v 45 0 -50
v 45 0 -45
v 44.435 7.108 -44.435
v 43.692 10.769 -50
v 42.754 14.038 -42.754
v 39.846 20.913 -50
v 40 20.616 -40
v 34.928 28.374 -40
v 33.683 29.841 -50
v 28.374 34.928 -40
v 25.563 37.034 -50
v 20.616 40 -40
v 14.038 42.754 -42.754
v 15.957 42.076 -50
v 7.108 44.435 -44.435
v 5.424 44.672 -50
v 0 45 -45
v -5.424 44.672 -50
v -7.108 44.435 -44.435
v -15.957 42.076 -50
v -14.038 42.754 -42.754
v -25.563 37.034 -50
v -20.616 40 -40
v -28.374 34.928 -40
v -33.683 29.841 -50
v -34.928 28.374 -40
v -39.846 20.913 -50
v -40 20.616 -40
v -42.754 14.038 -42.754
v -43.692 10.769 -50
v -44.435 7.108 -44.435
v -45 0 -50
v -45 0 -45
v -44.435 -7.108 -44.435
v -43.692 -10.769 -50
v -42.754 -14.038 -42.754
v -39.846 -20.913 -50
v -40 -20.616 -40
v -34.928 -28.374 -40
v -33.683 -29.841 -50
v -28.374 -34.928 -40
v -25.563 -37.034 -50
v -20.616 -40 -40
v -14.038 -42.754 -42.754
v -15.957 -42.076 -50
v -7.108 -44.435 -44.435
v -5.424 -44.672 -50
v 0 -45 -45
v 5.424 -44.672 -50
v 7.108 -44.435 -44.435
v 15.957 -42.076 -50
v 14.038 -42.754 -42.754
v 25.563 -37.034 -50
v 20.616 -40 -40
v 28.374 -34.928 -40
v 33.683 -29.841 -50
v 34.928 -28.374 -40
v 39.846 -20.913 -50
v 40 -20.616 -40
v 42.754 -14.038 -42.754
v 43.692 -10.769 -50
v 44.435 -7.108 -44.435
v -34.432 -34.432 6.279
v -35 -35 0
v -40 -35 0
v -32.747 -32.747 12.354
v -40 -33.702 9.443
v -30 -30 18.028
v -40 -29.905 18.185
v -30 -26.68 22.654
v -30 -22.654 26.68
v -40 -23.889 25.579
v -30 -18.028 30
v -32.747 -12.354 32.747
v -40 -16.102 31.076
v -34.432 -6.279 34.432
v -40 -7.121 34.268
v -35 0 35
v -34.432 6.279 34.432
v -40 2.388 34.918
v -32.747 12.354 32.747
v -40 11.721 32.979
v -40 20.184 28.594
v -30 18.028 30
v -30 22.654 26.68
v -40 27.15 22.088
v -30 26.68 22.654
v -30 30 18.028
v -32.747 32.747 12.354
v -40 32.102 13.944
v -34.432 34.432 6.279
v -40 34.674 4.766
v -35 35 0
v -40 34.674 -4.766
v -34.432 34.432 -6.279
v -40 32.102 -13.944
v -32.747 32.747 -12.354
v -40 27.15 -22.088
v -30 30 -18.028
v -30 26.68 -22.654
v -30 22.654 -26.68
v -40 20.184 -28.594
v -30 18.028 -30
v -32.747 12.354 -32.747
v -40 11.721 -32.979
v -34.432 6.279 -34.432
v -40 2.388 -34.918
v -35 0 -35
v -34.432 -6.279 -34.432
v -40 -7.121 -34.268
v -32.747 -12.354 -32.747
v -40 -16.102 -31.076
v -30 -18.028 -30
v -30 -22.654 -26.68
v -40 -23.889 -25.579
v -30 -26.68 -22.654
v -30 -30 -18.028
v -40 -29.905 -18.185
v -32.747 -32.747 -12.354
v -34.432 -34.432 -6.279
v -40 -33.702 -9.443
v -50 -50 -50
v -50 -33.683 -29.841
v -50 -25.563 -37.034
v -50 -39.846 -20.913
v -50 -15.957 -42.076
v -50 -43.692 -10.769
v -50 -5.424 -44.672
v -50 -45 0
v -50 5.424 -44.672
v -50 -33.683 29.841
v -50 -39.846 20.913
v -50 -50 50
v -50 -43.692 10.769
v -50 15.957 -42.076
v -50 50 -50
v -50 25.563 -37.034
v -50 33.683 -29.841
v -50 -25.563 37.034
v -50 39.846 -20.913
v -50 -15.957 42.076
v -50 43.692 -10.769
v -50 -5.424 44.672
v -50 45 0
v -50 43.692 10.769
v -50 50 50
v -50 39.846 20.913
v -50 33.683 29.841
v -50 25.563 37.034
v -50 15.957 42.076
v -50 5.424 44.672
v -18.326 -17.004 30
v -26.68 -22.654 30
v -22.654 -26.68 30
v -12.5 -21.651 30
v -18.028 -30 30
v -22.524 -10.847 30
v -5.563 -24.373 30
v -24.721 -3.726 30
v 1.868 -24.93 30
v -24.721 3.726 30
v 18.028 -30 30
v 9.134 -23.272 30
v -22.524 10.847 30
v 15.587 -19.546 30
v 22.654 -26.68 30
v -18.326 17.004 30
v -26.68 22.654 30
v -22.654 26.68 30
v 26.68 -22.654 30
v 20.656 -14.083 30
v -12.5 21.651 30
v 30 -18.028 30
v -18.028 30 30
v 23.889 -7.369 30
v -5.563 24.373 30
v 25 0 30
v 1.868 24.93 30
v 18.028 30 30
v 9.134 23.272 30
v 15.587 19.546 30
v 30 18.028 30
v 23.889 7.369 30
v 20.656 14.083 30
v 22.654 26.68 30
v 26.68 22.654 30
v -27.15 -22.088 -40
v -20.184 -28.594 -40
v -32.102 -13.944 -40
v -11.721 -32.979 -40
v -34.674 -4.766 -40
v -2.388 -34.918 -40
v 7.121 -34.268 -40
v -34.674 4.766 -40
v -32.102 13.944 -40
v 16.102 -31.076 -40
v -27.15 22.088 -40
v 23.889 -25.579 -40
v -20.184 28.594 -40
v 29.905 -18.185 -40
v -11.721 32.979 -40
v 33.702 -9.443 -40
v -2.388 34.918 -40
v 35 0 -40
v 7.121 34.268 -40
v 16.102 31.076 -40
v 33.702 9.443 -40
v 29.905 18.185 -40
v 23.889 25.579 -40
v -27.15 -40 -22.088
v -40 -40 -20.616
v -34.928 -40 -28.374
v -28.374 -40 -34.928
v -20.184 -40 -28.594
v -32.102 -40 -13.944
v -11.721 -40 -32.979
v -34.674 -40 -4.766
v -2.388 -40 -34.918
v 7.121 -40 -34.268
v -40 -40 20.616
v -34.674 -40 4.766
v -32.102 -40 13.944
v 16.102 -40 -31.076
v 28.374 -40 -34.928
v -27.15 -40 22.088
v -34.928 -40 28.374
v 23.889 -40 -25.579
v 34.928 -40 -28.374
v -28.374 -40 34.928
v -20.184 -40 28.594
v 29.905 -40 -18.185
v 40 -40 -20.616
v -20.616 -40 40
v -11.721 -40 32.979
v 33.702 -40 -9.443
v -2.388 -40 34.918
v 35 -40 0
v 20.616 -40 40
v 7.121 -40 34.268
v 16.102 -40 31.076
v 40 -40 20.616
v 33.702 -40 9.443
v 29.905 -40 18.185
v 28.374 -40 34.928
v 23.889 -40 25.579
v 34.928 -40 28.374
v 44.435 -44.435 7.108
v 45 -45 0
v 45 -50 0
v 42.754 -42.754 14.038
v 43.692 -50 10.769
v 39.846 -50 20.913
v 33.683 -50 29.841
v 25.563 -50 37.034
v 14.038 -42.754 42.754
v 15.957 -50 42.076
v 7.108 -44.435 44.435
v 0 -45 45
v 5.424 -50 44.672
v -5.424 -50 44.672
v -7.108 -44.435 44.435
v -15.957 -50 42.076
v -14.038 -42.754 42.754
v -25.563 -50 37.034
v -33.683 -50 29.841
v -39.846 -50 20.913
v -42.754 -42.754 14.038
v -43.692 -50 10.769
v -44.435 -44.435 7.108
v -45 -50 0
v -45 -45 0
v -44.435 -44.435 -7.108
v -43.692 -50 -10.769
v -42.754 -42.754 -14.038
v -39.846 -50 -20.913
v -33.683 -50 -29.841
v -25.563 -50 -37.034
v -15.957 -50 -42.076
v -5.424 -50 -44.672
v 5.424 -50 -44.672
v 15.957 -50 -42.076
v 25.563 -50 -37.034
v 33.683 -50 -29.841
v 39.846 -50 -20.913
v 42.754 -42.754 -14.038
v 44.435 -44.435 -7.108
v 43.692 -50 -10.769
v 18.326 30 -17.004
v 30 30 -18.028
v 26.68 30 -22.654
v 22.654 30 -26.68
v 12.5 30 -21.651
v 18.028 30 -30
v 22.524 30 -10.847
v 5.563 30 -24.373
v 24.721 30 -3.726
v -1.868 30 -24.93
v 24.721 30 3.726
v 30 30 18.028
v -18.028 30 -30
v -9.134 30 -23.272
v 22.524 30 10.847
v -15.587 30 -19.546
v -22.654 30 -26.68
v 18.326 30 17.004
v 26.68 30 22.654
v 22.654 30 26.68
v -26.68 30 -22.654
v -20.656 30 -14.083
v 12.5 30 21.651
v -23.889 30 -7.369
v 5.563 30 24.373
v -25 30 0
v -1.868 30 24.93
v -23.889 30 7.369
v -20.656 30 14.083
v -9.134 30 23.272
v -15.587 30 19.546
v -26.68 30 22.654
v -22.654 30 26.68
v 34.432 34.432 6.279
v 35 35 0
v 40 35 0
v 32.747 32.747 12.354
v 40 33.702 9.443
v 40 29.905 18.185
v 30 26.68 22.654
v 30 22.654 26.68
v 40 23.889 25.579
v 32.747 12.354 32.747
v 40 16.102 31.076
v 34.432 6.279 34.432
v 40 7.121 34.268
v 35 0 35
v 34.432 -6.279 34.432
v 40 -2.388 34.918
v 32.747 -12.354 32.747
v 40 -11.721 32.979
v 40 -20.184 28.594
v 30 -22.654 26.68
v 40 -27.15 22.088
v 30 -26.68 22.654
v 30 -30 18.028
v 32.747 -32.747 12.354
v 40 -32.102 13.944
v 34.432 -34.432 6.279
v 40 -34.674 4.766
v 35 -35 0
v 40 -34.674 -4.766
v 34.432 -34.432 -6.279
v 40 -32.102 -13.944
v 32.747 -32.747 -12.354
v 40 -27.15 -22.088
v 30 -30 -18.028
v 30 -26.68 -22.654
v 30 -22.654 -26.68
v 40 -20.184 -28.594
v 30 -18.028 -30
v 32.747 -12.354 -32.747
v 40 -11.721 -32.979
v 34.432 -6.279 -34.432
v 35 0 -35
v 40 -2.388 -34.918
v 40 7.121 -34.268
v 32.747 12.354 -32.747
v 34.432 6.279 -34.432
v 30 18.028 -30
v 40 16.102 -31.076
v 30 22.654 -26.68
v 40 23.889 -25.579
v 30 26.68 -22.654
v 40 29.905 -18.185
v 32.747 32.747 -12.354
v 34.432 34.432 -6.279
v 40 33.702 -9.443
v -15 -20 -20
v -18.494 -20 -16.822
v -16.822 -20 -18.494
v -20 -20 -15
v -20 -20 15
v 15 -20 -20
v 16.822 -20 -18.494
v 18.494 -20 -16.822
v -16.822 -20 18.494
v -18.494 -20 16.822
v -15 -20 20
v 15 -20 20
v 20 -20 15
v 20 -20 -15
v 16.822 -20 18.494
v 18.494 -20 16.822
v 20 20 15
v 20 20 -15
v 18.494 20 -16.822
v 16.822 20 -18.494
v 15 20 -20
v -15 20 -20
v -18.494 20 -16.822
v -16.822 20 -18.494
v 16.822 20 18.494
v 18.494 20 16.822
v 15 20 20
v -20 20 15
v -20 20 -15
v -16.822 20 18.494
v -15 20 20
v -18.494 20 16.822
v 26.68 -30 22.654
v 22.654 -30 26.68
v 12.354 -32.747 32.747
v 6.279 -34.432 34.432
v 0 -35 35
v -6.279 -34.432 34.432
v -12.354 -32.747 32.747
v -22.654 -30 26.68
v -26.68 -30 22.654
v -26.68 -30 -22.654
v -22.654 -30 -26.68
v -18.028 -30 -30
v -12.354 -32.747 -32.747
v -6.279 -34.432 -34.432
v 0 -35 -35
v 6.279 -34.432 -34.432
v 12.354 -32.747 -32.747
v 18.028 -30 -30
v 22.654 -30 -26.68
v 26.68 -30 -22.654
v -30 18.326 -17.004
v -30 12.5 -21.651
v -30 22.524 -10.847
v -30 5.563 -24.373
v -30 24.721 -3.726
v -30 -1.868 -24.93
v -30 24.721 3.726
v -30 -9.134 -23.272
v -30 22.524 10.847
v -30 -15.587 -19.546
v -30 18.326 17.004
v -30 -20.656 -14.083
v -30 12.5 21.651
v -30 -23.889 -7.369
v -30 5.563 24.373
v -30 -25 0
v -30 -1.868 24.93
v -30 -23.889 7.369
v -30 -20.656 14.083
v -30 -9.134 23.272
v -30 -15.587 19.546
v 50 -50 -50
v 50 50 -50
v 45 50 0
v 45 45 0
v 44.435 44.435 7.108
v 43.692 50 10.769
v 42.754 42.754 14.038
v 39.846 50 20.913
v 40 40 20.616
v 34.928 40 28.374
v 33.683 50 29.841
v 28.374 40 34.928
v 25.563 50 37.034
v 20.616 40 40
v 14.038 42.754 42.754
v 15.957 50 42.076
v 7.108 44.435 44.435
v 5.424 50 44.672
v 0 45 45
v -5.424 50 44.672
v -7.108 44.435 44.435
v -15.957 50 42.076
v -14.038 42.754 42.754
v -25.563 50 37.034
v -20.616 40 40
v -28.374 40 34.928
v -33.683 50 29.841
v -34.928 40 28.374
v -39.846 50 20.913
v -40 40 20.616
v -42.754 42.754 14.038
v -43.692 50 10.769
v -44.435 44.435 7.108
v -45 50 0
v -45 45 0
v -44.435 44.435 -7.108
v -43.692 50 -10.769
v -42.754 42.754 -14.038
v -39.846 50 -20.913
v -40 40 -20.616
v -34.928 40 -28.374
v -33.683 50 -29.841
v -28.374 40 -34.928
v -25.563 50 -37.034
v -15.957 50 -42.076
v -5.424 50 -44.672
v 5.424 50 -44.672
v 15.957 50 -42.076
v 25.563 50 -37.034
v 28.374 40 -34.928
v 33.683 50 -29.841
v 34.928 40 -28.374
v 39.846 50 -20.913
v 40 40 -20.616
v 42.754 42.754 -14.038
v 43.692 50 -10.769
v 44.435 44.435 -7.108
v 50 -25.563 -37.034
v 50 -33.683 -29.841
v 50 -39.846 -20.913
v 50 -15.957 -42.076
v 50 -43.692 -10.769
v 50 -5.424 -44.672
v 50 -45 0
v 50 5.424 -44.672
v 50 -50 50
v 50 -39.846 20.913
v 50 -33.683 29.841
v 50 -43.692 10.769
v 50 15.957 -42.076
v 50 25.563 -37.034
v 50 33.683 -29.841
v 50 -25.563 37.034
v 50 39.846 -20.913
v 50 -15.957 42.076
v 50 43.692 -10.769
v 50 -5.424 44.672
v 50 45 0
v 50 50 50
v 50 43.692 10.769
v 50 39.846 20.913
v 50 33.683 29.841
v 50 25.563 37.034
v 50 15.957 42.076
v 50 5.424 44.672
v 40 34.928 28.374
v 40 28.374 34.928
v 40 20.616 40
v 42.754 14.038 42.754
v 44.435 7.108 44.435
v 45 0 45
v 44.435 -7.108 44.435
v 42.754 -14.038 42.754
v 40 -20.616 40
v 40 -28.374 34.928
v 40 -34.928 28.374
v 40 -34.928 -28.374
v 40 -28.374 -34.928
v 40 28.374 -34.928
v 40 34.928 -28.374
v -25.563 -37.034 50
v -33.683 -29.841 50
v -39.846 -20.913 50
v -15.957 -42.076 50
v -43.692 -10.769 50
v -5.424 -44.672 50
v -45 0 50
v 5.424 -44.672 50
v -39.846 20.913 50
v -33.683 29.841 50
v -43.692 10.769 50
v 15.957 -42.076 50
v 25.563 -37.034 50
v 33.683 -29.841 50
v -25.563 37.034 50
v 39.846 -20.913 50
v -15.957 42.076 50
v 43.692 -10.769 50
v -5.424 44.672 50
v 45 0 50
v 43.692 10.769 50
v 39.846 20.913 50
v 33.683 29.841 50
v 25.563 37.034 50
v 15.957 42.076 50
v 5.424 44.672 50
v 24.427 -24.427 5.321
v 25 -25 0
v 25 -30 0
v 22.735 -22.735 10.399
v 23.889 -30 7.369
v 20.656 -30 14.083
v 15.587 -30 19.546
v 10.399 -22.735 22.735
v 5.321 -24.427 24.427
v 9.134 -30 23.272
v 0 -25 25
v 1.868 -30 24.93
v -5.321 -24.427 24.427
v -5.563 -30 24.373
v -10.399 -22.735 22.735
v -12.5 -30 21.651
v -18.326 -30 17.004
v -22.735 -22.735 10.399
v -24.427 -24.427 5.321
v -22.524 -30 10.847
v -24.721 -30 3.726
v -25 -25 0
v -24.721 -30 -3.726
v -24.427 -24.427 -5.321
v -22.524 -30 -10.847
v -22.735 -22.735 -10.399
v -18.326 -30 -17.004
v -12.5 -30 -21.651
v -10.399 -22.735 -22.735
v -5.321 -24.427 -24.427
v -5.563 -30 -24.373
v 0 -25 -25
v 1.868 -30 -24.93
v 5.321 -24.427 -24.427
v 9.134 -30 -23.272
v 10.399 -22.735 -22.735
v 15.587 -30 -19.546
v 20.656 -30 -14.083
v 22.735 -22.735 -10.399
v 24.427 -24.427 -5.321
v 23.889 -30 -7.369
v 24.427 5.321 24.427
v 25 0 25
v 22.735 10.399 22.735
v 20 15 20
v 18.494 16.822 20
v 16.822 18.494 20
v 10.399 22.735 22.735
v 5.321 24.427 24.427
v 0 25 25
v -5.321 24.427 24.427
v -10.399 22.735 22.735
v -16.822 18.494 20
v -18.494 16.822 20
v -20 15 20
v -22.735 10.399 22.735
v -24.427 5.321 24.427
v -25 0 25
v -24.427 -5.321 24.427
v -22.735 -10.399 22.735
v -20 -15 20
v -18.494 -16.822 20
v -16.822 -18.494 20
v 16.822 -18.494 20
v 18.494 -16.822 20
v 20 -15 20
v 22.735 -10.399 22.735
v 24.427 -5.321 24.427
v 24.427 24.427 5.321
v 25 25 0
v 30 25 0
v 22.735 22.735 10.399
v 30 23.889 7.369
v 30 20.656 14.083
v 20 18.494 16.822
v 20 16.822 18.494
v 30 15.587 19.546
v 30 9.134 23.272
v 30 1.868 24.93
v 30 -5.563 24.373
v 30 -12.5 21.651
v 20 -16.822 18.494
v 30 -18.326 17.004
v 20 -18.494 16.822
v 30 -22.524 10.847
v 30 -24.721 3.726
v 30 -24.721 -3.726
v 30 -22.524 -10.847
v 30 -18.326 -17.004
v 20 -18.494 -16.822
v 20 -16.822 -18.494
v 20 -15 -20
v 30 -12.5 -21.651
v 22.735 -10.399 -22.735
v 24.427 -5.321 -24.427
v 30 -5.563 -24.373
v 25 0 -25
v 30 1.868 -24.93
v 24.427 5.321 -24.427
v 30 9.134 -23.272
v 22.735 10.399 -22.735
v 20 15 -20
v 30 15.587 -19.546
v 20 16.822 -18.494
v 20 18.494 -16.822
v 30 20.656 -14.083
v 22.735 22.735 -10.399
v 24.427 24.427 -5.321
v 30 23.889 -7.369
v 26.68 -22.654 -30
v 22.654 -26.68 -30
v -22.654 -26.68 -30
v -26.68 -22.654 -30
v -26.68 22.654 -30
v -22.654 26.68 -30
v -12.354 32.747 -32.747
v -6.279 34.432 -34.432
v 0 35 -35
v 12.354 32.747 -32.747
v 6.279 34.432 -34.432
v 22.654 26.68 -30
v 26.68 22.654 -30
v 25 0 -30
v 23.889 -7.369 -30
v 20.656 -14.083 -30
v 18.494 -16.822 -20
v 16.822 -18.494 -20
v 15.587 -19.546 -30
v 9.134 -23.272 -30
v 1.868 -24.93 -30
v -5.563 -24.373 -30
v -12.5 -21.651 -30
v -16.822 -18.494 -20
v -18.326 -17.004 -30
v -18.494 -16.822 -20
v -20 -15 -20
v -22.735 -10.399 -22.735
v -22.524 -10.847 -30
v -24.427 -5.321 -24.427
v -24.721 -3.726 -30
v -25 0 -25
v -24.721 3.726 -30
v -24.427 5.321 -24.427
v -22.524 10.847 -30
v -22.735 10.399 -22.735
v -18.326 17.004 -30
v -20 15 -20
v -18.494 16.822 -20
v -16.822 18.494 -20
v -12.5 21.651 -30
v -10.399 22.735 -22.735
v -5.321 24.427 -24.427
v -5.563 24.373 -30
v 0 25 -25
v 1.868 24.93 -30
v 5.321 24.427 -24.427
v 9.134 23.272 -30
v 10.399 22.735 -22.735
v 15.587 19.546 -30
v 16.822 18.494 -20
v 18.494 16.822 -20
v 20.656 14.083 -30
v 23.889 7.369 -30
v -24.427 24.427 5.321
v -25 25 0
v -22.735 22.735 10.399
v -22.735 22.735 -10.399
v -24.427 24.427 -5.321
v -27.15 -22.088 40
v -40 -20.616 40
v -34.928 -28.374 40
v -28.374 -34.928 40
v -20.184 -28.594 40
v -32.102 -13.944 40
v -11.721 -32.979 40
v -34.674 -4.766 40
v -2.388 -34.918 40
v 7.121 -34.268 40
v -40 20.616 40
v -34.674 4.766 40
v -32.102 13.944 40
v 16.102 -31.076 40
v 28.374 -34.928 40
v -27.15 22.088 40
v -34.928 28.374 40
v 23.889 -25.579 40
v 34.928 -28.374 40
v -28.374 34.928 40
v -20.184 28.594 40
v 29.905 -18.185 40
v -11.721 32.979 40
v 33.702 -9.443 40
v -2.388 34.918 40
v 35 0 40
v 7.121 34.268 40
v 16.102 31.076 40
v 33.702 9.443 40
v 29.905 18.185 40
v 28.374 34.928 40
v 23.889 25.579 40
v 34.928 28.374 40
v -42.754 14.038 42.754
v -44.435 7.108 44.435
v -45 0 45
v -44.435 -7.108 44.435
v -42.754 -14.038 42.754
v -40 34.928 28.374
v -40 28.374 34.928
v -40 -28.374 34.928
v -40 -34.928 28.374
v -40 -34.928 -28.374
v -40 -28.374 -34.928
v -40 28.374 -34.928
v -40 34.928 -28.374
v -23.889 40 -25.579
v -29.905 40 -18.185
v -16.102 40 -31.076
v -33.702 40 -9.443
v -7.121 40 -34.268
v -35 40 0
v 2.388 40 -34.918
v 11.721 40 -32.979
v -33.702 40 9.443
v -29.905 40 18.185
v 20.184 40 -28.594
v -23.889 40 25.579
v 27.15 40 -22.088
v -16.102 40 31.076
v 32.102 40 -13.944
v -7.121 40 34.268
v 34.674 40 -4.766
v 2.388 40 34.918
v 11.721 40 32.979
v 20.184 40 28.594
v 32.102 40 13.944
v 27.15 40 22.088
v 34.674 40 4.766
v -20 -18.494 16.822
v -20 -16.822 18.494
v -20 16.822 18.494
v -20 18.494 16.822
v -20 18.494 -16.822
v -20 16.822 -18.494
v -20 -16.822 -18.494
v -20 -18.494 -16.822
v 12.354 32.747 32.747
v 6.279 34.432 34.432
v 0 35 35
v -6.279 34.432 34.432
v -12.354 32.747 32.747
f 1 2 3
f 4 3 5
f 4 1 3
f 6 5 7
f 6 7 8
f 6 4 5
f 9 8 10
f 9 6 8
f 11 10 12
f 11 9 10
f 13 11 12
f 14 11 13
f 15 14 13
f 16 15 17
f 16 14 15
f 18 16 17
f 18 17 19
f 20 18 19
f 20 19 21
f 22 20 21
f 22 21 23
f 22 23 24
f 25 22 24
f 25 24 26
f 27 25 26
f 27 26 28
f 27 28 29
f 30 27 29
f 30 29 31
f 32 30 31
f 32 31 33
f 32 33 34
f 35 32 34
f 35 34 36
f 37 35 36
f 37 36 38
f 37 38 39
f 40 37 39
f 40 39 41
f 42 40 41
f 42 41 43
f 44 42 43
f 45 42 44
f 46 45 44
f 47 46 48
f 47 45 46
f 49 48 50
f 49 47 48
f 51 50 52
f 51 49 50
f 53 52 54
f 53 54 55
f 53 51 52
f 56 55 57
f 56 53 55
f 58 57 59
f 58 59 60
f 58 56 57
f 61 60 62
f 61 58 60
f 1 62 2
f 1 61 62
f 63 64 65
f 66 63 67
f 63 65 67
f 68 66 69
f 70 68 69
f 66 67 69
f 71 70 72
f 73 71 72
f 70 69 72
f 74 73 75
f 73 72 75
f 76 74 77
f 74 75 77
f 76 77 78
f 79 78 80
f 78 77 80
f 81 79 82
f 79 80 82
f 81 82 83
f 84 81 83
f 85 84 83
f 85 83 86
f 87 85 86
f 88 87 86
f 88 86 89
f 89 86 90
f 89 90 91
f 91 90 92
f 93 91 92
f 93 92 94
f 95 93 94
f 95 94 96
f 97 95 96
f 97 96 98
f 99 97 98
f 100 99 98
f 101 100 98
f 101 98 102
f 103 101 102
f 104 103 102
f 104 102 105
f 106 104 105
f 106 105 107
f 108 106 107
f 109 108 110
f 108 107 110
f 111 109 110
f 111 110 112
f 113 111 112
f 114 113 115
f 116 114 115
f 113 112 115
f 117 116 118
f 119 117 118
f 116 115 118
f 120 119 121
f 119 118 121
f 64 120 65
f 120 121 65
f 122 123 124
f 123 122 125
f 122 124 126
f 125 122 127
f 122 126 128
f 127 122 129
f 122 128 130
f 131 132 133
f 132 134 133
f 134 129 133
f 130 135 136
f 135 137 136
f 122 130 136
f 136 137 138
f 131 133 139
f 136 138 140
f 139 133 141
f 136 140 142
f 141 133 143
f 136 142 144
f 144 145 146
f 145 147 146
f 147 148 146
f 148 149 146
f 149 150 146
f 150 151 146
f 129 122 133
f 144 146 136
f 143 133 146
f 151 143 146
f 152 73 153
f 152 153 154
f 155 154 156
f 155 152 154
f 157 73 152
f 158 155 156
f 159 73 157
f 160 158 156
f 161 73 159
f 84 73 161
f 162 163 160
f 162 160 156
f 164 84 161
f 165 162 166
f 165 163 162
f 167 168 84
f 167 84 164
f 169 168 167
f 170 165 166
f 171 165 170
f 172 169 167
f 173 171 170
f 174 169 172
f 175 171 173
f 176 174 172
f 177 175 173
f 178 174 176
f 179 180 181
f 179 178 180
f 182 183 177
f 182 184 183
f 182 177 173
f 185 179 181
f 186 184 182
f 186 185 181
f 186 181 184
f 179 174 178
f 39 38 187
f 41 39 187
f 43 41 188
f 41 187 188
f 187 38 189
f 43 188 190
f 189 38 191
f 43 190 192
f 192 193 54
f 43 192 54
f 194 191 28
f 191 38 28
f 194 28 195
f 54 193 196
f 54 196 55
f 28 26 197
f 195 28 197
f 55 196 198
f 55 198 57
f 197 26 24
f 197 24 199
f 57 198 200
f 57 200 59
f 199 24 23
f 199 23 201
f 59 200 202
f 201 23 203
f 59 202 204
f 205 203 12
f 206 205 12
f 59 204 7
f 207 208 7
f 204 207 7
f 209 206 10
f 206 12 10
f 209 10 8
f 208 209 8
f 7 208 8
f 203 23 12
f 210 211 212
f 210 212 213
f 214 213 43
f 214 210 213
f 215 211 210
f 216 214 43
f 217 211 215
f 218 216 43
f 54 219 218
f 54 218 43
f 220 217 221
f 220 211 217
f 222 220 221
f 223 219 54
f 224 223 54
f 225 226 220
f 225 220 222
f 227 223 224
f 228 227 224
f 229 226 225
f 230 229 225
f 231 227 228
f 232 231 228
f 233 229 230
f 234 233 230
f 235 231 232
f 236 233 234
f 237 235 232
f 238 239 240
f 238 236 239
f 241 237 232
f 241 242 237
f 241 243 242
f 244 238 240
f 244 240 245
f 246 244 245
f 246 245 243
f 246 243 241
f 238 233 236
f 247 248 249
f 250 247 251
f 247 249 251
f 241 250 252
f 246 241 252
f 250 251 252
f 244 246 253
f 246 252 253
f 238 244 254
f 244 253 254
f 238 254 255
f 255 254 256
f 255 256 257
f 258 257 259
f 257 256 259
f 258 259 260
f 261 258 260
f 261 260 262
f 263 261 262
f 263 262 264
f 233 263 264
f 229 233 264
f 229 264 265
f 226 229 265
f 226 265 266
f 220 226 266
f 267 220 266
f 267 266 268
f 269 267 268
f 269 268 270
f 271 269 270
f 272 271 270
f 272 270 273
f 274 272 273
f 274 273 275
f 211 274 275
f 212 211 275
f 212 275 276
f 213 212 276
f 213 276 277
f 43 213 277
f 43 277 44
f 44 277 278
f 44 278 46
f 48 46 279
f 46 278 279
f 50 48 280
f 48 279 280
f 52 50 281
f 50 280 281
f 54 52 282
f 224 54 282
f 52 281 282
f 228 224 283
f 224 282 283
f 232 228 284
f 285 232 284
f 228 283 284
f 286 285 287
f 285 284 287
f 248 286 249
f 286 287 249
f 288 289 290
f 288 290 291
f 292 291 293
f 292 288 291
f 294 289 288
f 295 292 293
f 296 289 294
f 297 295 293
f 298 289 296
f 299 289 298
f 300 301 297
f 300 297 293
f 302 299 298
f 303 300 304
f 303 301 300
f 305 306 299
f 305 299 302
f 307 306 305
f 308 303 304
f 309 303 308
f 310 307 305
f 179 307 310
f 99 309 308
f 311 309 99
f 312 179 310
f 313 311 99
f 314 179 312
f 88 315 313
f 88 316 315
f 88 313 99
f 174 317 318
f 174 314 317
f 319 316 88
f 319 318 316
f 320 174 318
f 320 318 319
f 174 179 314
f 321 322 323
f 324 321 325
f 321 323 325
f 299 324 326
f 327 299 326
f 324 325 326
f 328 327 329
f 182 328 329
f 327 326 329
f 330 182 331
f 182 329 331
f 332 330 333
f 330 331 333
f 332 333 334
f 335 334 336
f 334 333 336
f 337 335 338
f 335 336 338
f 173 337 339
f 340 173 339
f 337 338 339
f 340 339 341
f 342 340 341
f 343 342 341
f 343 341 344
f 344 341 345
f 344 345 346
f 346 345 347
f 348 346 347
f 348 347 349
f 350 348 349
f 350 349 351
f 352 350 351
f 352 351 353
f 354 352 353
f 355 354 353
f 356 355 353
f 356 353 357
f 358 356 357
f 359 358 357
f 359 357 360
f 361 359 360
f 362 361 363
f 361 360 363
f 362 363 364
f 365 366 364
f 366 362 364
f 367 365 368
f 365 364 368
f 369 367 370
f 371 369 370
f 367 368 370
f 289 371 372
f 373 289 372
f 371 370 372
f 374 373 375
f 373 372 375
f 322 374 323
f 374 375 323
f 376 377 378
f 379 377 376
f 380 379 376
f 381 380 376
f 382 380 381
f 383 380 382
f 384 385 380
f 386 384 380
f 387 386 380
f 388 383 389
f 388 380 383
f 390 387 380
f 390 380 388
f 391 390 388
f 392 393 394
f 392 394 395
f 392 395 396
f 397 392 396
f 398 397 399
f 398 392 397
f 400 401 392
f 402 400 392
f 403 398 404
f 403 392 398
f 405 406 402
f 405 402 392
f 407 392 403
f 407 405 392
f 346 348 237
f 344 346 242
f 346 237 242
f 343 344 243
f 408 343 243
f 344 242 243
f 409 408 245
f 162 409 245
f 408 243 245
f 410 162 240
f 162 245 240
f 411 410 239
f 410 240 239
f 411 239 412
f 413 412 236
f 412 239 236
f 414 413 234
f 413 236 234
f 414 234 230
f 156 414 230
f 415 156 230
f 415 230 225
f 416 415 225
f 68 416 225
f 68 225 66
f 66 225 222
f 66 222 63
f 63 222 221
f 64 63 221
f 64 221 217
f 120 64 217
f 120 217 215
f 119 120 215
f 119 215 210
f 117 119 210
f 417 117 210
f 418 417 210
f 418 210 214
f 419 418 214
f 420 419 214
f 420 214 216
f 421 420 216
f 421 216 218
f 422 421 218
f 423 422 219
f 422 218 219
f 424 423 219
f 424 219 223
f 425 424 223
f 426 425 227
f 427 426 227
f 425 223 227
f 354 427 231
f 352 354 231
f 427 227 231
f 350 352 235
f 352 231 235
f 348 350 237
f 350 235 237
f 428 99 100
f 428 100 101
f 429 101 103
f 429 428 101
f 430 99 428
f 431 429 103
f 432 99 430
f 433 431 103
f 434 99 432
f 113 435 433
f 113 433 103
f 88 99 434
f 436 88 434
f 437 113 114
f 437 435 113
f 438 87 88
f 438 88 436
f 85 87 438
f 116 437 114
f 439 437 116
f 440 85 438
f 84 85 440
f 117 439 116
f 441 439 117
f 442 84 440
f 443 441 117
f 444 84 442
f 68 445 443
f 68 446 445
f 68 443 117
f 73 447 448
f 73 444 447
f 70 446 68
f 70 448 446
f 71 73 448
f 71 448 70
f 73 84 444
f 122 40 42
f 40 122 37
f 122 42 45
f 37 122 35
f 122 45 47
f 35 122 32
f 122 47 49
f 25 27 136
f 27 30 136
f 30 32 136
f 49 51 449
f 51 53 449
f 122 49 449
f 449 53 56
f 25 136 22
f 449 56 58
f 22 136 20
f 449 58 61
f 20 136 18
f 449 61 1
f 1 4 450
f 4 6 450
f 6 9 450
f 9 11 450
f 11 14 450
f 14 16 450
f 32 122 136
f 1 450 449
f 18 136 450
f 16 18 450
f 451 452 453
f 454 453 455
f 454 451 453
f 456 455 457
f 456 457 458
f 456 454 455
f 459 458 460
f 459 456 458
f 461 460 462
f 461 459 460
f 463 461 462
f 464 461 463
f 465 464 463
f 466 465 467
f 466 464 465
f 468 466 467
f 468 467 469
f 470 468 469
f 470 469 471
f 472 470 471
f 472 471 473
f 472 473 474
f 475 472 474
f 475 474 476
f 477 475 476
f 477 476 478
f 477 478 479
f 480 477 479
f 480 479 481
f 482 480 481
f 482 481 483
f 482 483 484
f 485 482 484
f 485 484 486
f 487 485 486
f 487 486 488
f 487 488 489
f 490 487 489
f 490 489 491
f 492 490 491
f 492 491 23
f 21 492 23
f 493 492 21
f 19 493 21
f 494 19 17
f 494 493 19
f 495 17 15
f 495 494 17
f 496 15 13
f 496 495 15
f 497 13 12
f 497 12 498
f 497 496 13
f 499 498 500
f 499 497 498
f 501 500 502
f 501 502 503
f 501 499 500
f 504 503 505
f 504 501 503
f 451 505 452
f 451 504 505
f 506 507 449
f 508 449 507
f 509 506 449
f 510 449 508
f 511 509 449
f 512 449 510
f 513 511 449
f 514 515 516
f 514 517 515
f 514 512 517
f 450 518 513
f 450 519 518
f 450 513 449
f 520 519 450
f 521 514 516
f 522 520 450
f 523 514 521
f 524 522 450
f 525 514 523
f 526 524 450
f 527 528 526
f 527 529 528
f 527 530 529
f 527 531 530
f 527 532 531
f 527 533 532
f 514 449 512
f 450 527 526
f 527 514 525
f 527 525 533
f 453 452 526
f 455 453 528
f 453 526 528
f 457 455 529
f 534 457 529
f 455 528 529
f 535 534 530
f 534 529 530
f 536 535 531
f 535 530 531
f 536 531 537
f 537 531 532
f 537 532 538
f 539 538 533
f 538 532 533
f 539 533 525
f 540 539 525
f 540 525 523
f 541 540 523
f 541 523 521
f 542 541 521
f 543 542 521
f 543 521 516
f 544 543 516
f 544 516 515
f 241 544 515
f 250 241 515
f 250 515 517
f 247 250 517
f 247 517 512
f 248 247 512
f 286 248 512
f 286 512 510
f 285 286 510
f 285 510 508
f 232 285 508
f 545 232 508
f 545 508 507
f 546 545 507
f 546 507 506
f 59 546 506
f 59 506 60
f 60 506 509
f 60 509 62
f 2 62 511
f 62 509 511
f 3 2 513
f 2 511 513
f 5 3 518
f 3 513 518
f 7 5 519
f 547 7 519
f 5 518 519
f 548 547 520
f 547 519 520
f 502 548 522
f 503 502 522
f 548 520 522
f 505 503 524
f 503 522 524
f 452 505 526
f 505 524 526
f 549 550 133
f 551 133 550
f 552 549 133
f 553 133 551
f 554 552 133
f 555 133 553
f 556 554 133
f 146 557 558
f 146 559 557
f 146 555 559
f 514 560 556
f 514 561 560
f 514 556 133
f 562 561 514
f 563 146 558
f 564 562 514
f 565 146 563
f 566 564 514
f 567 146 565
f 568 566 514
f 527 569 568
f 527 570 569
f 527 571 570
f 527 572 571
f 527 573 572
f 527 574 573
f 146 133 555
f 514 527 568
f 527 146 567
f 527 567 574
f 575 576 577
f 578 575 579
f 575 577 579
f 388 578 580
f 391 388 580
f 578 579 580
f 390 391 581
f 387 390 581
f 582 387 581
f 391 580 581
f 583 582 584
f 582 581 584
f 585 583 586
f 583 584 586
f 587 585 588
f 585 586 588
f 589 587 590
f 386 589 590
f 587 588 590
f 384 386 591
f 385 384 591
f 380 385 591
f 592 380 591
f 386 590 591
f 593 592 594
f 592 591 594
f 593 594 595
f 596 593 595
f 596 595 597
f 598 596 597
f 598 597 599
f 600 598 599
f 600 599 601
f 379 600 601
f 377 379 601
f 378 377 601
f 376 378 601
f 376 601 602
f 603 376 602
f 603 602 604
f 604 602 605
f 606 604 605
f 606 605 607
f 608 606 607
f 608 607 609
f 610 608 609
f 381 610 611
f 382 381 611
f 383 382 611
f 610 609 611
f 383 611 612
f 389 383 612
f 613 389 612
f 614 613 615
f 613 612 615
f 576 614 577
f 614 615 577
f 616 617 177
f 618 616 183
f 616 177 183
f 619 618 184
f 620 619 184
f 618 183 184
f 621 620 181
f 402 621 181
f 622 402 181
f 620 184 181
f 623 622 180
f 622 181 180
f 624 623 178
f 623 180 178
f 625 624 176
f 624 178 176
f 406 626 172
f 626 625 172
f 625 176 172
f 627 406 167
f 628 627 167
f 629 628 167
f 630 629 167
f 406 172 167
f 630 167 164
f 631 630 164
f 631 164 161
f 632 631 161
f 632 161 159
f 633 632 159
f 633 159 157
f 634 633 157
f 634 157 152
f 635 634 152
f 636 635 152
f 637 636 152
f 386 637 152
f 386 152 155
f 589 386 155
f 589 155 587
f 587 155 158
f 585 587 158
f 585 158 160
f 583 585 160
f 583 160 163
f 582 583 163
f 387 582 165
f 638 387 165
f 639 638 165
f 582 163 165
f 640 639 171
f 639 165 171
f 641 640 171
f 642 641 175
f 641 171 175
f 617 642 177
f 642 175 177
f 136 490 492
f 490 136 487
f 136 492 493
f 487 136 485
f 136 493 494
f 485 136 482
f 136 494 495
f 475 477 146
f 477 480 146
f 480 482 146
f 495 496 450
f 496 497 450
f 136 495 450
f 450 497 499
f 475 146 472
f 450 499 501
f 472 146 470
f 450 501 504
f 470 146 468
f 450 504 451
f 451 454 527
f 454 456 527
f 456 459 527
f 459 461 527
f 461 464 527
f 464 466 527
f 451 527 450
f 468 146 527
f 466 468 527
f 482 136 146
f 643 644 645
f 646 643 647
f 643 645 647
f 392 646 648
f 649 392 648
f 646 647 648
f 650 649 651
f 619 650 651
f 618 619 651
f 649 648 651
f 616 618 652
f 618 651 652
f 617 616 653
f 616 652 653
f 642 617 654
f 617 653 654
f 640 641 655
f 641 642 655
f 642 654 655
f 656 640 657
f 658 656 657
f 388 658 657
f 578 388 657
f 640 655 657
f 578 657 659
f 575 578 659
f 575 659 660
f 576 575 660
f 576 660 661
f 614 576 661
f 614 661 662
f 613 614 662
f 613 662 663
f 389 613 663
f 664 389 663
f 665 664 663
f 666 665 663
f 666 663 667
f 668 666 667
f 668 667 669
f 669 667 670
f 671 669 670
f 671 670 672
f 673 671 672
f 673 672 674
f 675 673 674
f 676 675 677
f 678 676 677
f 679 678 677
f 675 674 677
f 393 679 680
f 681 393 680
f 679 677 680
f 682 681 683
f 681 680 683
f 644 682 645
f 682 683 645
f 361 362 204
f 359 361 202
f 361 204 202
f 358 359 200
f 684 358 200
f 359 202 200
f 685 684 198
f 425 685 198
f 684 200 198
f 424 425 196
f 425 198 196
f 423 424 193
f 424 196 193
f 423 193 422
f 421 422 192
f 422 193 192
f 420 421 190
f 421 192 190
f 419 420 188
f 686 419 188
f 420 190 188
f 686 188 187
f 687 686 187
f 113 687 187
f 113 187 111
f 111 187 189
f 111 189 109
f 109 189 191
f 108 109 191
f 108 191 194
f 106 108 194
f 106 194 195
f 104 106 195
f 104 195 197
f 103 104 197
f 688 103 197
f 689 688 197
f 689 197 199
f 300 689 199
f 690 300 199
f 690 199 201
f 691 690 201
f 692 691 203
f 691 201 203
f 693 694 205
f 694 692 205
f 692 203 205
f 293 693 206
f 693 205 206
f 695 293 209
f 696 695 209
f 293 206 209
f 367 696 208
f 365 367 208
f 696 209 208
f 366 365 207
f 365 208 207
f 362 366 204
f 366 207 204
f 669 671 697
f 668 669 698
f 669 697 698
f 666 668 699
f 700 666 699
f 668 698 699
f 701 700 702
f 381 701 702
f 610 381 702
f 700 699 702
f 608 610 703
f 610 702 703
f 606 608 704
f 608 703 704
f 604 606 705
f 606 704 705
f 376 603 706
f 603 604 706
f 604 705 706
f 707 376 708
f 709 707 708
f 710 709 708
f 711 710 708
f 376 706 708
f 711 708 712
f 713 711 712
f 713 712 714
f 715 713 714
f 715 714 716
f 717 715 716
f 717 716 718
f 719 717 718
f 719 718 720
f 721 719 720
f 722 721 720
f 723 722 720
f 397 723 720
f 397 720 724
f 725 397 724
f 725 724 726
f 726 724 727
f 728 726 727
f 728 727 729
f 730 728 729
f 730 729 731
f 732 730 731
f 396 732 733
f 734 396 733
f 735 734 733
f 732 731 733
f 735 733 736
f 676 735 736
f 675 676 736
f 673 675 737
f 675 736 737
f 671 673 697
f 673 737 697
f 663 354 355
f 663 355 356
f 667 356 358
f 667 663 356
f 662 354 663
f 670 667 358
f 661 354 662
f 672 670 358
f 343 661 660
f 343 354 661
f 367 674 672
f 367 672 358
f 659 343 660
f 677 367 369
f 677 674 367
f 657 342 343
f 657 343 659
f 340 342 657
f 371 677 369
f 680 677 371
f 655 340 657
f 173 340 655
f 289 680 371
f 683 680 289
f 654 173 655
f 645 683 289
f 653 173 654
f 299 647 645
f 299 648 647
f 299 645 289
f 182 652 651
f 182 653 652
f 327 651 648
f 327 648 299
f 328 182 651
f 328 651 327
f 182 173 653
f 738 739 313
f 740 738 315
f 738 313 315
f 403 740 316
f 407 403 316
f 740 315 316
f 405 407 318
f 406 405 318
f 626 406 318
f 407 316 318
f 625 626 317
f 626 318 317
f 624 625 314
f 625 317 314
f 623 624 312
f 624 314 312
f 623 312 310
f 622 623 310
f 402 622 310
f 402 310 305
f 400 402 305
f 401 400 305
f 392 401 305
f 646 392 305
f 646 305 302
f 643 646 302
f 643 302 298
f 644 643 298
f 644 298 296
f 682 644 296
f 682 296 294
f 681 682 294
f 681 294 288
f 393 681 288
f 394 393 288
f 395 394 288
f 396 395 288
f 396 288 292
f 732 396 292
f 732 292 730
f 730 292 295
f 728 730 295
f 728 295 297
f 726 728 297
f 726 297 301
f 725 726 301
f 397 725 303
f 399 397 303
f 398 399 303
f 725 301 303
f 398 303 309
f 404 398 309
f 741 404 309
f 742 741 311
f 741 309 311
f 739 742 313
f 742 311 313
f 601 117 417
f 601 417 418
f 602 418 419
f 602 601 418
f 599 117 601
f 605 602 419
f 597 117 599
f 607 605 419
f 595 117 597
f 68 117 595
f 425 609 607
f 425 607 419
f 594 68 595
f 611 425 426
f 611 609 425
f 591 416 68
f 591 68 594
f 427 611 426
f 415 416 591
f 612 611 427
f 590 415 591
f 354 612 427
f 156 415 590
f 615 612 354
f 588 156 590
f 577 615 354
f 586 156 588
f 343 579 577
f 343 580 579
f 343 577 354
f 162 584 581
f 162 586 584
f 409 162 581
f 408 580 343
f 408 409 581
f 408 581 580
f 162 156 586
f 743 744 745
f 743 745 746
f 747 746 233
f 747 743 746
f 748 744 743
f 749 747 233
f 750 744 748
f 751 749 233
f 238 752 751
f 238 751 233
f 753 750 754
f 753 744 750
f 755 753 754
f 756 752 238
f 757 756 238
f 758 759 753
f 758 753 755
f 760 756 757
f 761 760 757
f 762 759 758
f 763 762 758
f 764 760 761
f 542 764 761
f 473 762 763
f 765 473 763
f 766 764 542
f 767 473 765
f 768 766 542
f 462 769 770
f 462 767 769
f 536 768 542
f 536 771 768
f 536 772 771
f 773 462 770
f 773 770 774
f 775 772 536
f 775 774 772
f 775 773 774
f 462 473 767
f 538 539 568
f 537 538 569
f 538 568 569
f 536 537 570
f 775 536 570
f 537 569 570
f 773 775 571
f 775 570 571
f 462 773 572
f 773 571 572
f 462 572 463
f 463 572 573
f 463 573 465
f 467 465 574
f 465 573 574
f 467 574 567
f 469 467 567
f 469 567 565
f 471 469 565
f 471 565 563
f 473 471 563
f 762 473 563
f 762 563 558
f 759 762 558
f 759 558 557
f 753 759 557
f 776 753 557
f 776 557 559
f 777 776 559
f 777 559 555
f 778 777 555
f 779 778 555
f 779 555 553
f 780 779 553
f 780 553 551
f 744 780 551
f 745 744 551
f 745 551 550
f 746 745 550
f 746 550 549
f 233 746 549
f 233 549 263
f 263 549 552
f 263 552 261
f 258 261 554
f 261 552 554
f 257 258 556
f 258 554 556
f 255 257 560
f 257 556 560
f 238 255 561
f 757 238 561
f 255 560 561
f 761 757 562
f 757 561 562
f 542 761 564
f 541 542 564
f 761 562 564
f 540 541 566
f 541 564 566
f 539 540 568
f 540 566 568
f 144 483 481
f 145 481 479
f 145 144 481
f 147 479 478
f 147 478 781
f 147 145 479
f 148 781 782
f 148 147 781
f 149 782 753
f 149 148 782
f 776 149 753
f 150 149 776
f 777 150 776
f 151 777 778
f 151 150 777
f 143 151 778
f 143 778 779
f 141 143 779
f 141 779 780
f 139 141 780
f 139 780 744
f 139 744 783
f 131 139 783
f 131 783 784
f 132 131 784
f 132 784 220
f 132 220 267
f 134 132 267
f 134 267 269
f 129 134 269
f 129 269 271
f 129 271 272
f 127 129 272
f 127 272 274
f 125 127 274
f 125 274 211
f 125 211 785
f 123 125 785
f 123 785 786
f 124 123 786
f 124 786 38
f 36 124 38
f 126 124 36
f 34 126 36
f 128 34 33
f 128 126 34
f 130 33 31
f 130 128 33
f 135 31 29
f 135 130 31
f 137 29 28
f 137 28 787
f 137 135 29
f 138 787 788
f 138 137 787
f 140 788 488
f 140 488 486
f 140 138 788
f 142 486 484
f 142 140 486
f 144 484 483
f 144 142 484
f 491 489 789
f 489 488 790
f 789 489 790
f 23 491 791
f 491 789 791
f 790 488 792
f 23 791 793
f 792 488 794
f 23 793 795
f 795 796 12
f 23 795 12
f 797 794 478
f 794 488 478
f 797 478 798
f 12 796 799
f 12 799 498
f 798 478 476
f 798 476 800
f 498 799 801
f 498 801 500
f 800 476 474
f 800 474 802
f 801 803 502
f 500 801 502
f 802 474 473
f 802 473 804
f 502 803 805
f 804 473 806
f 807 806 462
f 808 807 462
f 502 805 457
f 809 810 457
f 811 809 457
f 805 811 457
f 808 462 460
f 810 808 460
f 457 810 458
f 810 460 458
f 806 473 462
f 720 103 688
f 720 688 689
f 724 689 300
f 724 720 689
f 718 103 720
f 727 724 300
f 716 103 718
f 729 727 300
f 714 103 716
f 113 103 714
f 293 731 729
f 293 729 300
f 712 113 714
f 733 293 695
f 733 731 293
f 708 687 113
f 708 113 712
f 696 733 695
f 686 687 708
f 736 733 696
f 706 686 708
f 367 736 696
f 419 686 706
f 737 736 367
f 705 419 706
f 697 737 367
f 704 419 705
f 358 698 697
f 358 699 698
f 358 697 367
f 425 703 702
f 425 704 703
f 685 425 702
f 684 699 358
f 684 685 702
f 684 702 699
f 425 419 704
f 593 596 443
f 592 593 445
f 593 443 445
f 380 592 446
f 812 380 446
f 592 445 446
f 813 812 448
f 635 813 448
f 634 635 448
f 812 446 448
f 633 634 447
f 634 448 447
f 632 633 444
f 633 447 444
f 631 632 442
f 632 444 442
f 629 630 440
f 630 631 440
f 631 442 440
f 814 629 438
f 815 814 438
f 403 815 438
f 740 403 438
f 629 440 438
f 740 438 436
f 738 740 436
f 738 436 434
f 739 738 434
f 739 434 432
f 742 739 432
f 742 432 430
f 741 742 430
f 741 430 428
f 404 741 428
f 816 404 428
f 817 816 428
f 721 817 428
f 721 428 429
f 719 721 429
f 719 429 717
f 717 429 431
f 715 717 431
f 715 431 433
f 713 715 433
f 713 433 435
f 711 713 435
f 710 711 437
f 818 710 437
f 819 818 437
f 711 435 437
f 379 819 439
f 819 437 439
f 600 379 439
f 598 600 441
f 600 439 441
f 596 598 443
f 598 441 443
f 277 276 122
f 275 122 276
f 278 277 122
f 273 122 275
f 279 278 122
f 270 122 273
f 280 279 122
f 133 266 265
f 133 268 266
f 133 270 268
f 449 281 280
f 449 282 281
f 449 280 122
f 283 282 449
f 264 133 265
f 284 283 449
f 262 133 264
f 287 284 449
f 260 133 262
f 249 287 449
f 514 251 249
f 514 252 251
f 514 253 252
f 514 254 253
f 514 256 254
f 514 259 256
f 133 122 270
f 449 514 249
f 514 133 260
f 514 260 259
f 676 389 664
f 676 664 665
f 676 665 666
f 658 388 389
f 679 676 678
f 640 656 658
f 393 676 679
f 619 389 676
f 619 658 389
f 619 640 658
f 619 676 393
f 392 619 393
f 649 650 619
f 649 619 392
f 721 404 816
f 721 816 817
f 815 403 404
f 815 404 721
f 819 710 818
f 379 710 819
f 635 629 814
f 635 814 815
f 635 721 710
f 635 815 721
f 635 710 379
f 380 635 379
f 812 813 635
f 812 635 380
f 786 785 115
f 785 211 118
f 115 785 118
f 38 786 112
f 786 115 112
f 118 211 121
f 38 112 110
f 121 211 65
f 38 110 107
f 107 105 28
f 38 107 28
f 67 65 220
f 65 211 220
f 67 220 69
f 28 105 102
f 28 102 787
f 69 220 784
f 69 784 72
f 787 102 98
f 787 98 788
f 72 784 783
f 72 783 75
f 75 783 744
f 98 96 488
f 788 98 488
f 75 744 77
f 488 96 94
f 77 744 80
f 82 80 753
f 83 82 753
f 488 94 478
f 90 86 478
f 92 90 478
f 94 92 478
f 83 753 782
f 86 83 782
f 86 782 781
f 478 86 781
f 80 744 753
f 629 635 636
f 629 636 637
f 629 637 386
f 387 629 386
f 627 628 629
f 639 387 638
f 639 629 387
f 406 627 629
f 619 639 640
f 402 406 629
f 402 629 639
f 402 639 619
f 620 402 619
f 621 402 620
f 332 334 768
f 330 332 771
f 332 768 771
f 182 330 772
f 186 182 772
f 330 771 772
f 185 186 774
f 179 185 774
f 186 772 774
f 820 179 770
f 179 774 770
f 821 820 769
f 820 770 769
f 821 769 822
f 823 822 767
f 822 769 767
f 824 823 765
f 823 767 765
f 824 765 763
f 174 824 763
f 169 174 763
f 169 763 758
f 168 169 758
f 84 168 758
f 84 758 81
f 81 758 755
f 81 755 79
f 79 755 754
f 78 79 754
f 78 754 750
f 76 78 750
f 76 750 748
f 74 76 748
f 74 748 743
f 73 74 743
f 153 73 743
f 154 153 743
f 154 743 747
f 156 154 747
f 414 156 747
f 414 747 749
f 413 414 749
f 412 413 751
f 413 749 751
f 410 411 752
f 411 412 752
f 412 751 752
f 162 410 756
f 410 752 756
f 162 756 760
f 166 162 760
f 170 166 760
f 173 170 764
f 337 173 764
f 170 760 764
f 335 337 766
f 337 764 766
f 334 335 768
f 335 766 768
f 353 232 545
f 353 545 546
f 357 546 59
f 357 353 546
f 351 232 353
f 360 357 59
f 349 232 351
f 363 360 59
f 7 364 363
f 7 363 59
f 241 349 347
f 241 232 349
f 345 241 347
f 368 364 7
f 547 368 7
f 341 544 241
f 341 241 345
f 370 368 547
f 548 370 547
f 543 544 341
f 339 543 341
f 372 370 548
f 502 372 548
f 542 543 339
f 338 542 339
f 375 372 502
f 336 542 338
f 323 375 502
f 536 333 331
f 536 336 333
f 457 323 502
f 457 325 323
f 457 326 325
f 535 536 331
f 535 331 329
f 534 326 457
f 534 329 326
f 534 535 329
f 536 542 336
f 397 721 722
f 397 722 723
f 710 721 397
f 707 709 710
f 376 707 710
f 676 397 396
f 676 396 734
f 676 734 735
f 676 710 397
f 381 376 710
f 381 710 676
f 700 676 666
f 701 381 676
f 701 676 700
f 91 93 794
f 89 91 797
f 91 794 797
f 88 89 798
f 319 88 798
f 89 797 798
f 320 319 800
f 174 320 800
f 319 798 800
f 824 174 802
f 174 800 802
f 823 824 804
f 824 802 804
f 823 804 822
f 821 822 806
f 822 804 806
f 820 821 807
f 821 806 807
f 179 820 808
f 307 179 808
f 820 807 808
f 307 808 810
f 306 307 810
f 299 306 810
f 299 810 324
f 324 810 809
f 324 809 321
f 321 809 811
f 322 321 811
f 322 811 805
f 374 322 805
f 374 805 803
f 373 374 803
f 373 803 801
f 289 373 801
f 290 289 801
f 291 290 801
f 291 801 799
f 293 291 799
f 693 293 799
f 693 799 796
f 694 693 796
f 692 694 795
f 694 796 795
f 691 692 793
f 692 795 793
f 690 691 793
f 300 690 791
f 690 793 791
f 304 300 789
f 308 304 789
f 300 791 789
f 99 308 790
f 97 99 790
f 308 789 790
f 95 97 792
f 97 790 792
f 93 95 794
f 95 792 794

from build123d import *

# Parameters (mm, degrees)
F2_W          = 100
F2_H          = 100
F3_DEPTH      = 50
F3_DEPTH_BACK = 50
F5_R          = 45
F6_DEPTH      = 10
F8_R          = 45
F9_DEPTH      = 10
F11_R         = 45
F12_DEPTH     = 10
F14_R         = 45
F15_DEPTH     = 10
F17_R         = 45
F18_DEPTH     = 10
F20_R         = 45
F21_DEPTH     = 10
F22_R         = 35
F23_DEPTH     = 10
F24_R         = 35
F25_DEPTH     = 10
F26_R         = 35
F27_DEPTH     = 10
F28_R         = 35
F29_DEPTH     = 10
F30_R         = 35
F31_DEPTH     = 10
F32_R         = 35
F33_DEPTH     = 10
F34_R         = 25
F35_DEPTH     = 10
F36_R         = 25
F37_DEPTH     = 10
F38_R         = 25
F39_DEPTH     = 10
F40_R         = 25
F41_DEPTH     = 10
F42_R         = 25
F43_DEPTH     = 10
F44_R         = 25
F45_DEPTH     = 10


with BuildPart() as f3:
    # F2 (on Top) → F3 (new body, two sides)
    with BuildSketch(Plane.XY) as f3_sk:
        Rectangle(F2_W, F2_H)
    extrude(amount=F3_DEPTH)
    extrude(f3_sk.sketch, amount=-F3_DEPTH_BACK)

    # F5 (on offset) → F6 (cut)
    with BuildSketch(Plane.XZ.offset(50)):
        Circle(F5_R)
    extrude(amount=-F6_DEPTH, mode=Mode.SUBTRACT)

    # F8 (on offset) → F9 (cut)
    with BuildSketch(Plane.YZ.offset(50)):
        Circle(F8_R)
    extrude(amount=-F9_DEPTH, mode=Mode.SUBTRACT)

    # F11 (on offset) → F12 (cut)
    with BuildSketch(Plane.XY.offset(50)):
        Circle(F11_R)
    extrude(amount=-F12_DEPTH, mode=Mode.SUBTRACT)

    # F14 (on offset) → F15 (cut)
    with BuildSketch(Plane.XY.offset(-50)):
        Circle(F14_R)
    extrude(amount=F15_DEPTH, mode=Mode.SUBTRACT)

    # F17 (on offset) → F18 (cut)
    with BuildSketch(Plane.XZ.offset(-50)):
        Circle(F17_R)
    extrude(amount=F18_DEPTH, mode=Mode.SUBTRACT)

    # F20 (on offset) → F21 (cut)
    with BuildSketch(Plane.YZ.offset(-50)):
        Circle(F20_R)
    extrude(amount=F21_DEPTH, mode=Mode.SUBTRACT)

    # F22 (on face) → F23 (cut)
    with BuildSketch(Plane(origin=(-40, 0, 0), x_dir=(0, -1, 0), z_dir=(-1, 0, 0))):
        Circle(F22_R)
    extrude(amount=-F23_DEPTH, mode=Mode.SUBTRACT)

    # F24 (on face) → F25 (cut)
    with BuildSketch(Plane.XZ.offset(40)):
        Circle(F24_R)
    extrude(amount=-F25_DEPTH, mode=Mode.SUBTRACT)

    # F26 (on face) → F27 (cut)
    with BuildSketch(Plane.XY.offset(40)):
        Circle(F26_R)
    extrude(amount=-F27_DEPTH, mode=Mode.SUBTRACT)

    # F28 (on face) → F29 (cut)
    with BuildSketch(Plane(origin=(0, 40, 0), x_dir=(-1, 0, 0), z_dir=(0, 1, 0))):
        Circle(F28_R)
    extrude(amount=-F29_DEPTH, mode=Mode.SUBTRACT)

    # F30 (on face) → F31 (cut)
    with BuildSketch(Plane(origin=(0, 0, -40), x_dir=(1, 0, 0), z_dir=(0, 0, -1))):
        Circle(F30_R)
    extrude(amount=-F31_DEPTH, mode=Mode.SUBTRACT)

    # F32 (on face) → F33 (cut)
    with BuildSketch(Plane.YZ.offset(40)):
        Circle(F32_R)
    extrude(amount=-F33_DEPTH, mode=Mode.SUBTRACT)

    # F34 (on face) → F35 (cut)
    with BuildSketch(Plane.XZ.offset(30)):
        Circle(F34_R)
    extrude(amount=-F35_DEPTH, mode=Mode.SUBTRACT)

    # F36 (on face) → F37 (cut)
    with BuildSketch(Plane(origin=(0, 0, -30), x_dir=(1, 0, 0), z_dir=(0, 0, -1))):
        Circle(F36_R)
    extrude(amount=-F37_DEPTH, mode=Mode.SUBTRACT)

    # F38 (on face) → F39 (cut)
    with BuildSketch(Plane(origin=(0, 30, 0), x_dir=(-1, 0, 0), z_dir=(0, 1, 0))):
        Circle(F38_R)
    extrude(amount=-F39_DEPTH, mode=Mode.SUBTRACT)

    # F40 (on face) → F41 (cut)
    with BuildSketch(Plane.XY.offset(30)):
        Circle(F40_R)
    extrude(amount=-F41_DEPTH, mode=Mode.SUBTRACT)

    # F42 (on face) → F43 (cut)
    with BuildSketch(Plane.YZ.offset(30)):
        Circle(F42_R)
    extrude(amount=-F43_DEPTH, mode=Mode.SUBTRACT)

    # F44 (on face) → F45 (cut)
    with BuildSketch(Plane(origin=(-30, 0, 0), x_dir=(0, -1, 0), z_dir=(-1, 0, 0))):
        Circle(F44_R)
    extrude(amount=-F45_DEPTH, mode=Mode.SUBTRACT)


solid = f3.part
